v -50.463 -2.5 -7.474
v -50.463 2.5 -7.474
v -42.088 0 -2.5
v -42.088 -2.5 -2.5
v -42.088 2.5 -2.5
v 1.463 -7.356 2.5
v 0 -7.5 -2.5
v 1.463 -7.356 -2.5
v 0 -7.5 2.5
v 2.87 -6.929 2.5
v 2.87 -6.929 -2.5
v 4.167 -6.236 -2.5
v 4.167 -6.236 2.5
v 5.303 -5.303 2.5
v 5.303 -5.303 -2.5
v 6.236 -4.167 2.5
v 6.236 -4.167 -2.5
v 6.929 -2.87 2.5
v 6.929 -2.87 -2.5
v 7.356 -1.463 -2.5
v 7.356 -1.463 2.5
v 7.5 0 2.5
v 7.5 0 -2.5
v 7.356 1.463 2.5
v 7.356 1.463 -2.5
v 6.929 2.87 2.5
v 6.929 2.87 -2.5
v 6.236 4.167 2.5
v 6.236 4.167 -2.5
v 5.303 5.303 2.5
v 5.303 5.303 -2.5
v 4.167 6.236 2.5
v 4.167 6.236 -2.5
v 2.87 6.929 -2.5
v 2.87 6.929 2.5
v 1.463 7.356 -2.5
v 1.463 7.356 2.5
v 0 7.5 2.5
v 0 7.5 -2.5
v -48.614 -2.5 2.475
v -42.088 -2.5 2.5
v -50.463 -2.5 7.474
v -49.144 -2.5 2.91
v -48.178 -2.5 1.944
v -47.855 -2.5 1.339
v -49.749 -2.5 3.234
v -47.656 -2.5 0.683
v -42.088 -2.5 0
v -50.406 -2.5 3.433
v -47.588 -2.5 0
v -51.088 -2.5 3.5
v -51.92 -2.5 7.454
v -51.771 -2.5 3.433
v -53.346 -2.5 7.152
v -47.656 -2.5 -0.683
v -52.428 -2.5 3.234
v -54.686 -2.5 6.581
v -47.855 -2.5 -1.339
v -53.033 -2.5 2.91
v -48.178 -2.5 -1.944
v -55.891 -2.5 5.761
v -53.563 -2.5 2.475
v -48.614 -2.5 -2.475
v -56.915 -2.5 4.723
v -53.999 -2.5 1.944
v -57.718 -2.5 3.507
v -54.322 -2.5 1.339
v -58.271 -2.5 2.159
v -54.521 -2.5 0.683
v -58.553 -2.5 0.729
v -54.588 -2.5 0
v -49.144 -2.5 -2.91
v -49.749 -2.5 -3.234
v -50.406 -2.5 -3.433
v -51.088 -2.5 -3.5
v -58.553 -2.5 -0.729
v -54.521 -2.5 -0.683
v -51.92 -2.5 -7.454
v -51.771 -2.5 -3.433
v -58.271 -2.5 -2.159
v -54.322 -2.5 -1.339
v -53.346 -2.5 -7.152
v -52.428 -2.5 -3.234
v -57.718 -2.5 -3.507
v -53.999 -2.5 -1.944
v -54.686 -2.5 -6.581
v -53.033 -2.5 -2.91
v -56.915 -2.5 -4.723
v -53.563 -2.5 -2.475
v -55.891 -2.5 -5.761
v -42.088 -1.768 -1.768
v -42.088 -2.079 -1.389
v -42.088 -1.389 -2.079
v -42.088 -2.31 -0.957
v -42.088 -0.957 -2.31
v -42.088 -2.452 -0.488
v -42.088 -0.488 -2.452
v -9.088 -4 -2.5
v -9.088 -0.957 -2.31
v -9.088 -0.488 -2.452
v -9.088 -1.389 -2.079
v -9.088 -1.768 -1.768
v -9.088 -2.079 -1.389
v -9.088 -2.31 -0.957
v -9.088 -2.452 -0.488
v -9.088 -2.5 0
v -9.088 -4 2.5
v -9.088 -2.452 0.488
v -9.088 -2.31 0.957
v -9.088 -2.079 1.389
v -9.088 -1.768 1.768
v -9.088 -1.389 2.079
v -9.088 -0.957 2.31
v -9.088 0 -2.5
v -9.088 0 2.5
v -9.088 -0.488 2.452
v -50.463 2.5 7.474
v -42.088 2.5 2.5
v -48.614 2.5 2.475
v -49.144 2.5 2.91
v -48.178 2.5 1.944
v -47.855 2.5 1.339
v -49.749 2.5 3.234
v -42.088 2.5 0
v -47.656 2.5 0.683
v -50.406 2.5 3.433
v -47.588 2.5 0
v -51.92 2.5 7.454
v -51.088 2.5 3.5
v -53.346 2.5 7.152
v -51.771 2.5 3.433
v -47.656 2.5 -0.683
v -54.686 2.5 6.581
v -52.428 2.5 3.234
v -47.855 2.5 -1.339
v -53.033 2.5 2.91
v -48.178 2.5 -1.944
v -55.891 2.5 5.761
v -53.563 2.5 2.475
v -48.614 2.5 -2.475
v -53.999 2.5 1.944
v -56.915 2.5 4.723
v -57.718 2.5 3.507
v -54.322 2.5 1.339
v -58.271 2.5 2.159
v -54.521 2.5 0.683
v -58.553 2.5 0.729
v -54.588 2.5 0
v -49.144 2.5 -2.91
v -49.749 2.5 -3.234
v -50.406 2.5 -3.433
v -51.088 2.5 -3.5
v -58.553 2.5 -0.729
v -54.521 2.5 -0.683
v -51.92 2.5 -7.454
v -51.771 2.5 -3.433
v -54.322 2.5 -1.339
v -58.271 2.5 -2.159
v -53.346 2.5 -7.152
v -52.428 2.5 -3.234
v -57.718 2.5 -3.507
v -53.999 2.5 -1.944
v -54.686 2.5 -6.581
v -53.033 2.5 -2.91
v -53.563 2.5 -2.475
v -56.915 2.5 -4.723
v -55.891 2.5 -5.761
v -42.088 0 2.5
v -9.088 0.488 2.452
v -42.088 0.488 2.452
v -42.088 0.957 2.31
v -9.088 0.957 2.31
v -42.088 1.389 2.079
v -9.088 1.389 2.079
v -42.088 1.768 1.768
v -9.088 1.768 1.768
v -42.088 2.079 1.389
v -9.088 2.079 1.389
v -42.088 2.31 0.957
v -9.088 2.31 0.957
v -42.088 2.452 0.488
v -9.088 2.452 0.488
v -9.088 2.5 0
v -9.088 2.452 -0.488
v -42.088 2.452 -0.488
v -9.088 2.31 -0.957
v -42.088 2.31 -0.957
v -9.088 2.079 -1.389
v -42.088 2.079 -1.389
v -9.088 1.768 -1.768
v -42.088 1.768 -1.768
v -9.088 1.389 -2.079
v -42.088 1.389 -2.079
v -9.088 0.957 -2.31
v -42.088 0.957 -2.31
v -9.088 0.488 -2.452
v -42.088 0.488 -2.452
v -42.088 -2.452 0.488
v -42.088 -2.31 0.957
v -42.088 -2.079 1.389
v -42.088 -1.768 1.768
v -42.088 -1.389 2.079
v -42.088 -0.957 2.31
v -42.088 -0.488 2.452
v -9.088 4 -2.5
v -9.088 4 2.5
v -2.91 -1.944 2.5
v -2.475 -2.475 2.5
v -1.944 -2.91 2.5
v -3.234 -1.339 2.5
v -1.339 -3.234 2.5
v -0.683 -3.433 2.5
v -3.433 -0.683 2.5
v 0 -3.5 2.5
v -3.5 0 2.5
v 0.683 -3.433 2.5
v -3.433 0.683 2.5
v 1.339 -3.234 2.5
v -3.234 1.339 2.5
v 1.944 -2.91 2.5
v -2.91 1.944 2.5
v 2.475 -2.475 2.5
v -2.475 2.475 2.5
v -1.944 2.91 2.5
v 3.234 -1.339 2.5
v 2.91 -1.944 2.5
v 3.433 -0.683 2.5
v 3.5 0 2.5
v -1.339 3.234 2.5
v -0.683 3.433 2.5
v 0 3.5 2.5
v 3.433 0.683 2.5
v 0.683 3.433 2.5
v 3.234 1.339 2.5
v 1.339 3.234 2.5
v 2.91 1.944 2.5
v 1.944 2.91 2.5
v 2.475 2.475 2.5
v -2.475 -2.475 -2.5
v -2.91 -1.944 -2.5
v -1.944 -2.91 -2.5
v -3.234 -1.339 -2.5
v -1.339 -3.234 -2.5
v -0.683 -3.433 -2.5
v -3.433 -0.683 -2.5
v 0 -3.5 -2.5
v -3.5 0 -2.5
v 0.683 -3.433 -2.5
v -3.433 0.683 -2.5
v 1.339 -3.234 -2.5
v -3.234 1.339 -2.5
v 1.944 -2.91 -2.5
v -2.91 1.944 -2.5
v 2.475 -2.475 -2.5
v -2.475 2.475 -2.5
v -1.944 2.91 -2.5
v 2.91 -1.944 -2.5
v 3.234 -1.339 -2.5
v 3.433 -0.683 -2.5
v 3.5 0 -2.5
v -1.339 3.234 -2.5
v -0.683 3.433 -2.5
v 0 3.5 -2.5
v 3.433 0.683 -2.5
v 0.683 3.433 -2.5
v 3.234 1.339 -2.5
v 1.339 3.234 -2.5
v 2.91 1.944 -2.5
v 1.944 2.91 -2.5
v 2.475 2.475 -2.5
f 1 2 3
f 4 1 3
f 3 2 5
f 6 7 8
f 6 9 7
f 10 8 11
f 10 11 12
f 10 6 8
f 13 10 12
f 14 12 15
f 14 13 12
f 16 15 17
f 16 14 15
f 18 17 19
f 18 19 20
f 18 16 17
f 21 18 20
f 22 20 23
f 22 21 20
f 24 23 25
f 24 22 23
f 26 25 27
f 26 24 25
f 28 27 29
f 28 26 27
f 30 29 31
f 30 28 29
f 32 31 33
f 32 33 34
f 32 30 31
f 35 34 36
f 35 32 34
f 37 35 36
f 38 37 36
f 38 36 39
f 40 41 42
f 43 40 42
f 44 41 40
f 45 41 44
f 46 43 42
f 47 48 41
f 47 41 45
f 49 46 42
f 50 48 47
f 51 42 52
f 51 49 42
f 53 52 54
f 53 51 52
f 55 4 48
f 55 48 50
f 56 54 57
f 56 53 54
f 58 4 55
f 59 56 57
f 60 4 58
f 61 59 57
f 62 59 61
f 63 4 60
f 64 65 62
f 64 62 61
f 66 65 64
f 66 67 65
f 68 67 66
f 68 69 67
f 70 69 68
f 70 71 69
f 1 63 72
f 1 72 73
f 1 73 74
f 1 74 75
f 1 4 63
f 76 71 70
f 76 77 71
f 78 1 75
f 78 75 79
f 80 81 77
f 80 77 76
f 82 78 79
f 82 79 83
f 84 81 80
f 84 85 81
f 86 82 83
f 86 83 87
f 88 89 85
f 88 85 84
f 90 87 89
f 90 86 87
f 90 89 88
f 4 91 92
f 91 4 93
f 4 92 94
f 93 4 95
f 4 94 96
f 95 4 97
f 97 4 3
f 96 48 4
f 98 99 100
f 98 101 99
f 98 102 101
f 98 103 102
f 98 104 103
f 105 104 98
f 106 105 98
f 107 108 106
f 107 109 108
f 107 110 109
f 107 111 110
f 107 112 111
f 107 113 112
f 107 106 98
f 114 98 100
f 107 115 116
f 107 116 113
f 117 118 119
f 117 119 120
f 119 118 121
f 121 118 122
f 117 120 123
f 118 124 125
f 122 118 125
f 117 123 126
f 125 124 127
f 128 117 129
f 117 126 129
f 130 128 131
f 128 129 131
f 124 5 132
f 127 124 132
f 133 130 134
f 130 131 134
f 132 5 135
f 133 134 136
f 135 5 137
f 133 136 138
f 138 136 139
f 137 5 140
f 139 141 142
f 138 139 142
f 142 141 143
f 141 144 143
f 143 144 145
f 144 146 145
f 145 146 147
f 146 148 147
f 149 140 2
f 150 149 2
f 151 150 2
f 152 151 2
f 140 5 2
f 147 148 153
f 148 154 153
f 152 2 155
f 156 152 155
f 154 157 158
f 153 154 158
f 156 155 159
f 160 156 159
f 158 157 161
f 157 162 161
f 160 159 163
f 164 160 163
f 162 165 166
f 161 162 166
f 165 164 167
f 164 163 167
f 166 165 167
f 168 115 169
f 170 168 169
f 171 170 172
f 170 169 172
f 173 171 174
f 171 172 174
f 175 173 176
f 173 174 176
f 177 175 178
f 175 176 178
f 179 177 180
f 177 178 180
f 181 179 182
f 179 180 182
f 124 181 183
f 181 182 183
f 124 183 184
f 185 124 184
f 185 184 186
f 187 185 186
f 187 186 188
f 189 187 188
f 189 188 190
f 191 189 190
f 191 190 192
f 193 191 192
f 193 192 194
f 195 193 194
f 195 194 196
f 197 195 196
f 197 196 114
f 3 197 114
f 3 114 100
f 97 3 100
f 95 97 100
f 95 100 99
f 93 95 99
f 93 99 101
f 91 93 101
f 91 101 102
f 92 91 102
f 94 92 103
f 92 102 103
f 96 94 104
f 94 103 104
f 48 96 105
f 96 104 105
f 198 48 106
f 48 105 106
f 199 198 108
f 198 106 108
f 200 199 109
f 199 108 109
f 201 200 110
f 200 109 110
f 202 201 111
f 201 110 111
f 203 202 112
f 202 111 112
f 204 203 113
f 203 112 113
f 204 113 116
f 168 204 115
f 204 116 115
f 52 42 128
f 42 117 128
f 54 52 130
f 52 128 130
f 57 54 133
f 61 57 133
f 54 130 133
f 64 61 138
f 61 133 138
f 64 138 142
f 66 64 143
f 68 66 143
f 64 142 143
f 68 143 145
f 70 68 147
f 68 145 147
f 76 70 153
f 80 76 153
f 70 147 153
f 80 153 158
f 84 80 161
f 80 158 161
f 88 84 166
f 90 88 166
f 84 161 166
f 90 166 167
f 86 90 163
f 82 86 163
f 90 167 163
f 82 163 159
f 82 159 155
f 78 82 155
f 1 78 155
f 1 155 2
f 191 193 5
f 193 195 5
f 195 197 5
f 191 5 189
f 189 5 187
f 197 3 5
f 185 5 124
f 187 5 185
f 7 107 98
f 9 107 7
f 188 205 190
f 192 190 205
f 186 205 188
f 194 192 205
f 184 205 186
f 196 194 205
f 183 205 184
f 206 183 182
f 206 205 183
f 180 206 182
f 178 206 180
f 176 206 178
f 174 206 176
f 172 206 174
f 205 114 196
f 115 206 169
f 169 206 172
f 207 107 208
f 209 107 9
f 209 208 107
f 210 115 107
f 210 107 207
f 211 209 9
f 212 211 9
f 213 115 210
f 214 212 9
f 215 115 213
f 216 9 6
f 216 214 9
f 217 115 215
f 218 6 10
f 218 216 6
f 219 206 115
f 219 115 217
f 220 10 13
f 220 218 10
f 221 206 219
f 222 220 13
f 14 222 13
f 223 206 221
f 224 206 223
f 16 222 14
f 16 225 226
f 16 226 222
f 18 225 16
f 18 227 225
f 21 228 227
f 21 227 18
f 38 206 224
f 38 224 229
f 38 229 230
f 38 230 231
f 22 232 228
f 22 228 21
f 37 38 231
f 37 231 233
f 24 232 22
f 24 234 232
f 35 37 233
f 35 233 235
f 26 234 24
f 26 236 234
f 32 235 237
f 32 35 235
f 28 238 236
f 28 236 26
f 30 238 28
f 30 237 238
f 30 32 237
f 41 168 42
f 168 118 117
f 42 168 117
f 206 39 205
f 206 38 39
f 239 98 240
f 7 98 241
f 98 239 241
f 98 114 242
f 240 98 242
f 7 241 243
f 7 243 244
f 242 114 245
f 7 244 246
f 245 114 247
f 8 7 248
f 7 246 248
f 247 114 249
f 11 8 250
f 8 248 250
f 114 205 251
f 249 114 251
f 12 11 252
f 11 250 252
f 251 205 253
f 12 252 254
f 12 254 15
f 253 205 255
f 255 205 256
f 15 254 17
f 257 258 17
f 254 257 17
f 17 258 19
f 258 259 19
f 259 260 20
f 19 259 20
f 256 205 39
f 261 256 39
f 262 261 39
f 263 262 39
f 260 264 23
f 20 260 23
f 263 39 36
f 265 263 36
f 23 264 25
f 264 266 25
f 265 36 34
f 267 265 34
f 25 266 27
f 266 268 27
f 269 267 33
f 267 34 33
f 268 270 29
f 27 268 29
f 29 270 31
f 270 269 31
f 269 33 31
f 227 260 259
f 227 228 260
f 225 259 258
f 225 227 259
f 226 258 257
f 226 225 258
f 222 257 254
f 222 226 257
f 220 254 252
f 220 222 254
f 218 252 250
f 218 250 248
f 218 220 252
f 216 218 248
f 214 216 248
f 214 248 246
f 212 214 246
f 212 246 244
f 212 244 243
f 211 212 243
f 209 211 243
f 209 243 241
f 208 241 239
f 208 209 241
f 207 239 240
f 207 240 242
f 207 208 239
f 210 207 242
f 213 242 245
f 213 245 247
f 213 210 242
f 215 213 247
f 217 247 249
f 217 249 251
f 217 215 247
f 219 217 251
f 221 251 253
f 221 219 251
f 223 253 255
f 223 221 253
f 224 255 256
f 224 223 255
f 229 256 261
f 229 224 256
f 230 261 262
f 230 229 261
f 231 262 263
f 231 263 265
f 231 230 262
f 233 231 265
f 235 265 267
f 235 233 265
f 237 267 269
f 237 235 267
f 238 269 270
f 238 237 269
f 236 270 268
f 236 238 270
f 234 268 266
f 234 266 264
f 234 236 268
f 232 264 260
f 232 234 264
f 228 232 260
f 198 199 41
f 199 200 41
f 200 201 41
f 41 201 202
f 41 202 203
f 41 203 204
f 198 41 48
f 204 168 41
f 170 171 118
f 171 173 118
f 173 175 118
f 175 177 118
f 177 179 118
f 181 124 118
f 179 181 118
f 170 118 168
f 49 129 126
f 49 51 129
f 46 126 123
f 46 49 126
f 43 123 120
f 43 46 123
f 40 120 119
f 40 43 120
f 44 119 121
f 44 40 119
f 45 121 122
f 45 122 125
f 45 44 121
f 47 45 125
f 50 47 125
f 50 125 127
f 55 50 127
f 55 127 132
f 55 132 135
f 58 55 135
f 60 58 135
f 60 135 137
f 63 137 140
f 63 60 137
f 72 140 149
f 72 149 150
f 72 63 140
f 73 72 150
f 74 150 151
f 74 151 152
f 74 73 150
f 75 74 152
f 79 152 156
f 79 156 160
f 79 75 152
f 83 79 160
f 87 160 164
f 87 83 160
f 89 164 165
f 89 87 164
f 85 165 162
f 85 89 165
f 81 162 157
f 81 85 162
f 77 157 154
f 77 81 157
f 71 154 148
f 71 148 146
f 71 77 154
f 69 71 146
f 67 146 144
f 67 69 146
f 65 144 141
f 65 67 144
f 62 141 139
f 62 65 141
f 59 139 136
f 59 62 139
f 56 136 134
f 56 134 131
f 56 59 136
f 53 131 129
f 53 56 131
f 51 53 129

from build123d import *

# Parameters (mm, degrees)
BOSS_EXTRUDE2_DEPTH = 2.5
SKETCH4_R           = 2.5
BOSS_EXTRUDE3_DEPTH = 33.000000000000014
SKETCH8_R           = 3.5000000000000004
BOSS_EXTRUDE4_DEPTH = 2.5


with BuildPart() as part:
    # Sketch1 → Boss-Extrude2 (new, symmetric)
    with BuildSketch(Plane.XY):
        with BuildLine():
            ThreePointArc((7.5, -3.5307e-13), (5.303300858899232, 5.303300858898982), (1.36e-15, 7.500000000000001))
            Line((0, 7.5), (-9.088423691387959, 4))
            Line((-9.088423691387959, 4), (-9.088423691387959, 0))
            Line((-9.088423691387959, 0), (-3.5, 0))
            ThreePointArc((-3.5, 4.3e-16), (2.1e-16, 3.5), (3.5, 0))
            Line((3.5, 0), (7.5, 0))
        make_face()
        with BuildLine():
            ThreePointArc((0, -7.499999999999999), (5.303300858898981, -5.303300858899231), (7.5, -3.5307e-13))
            Line((7.5, 0), (3.5, 0))
            ThreePointArc((3.5, -8.6e-16), (-6.4e-16, -3.5), (-3.5, 4.3e-16))
            Line((-3.5, 0), (-9.088423691387959, 0))
            Line((-9.088423691387959, 0), (-9.088423691387959, -4))
            Line((-9.088423691387959, -4), (0, -7.5))
        make_face()
    extrude(amount=BOSS_EXTRUDE2_DEPTH, both=True)

    # Sketch4 → Boss-Extrude3 (add)
    with BuildSketch(Plane.ZY.offset(9.088423691387959)):
        Circle(SKETCH4_R)
    extrude(amount=BOSS_EXTRUDE3_DEPTH)

    # Sketch8 → Boss-Extrude4 (add, symmetric)
    with BuildSketch(Plane(origin=(0, 0, 0), x_dir=(1, 0, 0), z_dir=(0, 1, 0))):
        with BuildLine():
            Line((-42.08842369138797, 2.5), (-42.08842369138797, -2.5))
            Line((-42.08842369138797, -2.5), (-50.46269365807758, -7.4738518800825435))
            ThreePointArc((-50.46269365807758, -7.4738518800825435), (-58.588423691387945, 9.2e-16), (-50.46269365807758, 7.473851880082519))
            Line((-50.46269365807758, 7.473851880082519), (-42.08842369138797, 2.5))
        make_face()
        with Locations(Location((-51.08842369138797, 0, 0), (0, 0, 270))):
            Circle(SKETCH8_R, mode=Mode.SUBTRACT)
    extrude(amount=BOSS_EXTRUDE4_DEPTH, both=True)


solid = part.part
